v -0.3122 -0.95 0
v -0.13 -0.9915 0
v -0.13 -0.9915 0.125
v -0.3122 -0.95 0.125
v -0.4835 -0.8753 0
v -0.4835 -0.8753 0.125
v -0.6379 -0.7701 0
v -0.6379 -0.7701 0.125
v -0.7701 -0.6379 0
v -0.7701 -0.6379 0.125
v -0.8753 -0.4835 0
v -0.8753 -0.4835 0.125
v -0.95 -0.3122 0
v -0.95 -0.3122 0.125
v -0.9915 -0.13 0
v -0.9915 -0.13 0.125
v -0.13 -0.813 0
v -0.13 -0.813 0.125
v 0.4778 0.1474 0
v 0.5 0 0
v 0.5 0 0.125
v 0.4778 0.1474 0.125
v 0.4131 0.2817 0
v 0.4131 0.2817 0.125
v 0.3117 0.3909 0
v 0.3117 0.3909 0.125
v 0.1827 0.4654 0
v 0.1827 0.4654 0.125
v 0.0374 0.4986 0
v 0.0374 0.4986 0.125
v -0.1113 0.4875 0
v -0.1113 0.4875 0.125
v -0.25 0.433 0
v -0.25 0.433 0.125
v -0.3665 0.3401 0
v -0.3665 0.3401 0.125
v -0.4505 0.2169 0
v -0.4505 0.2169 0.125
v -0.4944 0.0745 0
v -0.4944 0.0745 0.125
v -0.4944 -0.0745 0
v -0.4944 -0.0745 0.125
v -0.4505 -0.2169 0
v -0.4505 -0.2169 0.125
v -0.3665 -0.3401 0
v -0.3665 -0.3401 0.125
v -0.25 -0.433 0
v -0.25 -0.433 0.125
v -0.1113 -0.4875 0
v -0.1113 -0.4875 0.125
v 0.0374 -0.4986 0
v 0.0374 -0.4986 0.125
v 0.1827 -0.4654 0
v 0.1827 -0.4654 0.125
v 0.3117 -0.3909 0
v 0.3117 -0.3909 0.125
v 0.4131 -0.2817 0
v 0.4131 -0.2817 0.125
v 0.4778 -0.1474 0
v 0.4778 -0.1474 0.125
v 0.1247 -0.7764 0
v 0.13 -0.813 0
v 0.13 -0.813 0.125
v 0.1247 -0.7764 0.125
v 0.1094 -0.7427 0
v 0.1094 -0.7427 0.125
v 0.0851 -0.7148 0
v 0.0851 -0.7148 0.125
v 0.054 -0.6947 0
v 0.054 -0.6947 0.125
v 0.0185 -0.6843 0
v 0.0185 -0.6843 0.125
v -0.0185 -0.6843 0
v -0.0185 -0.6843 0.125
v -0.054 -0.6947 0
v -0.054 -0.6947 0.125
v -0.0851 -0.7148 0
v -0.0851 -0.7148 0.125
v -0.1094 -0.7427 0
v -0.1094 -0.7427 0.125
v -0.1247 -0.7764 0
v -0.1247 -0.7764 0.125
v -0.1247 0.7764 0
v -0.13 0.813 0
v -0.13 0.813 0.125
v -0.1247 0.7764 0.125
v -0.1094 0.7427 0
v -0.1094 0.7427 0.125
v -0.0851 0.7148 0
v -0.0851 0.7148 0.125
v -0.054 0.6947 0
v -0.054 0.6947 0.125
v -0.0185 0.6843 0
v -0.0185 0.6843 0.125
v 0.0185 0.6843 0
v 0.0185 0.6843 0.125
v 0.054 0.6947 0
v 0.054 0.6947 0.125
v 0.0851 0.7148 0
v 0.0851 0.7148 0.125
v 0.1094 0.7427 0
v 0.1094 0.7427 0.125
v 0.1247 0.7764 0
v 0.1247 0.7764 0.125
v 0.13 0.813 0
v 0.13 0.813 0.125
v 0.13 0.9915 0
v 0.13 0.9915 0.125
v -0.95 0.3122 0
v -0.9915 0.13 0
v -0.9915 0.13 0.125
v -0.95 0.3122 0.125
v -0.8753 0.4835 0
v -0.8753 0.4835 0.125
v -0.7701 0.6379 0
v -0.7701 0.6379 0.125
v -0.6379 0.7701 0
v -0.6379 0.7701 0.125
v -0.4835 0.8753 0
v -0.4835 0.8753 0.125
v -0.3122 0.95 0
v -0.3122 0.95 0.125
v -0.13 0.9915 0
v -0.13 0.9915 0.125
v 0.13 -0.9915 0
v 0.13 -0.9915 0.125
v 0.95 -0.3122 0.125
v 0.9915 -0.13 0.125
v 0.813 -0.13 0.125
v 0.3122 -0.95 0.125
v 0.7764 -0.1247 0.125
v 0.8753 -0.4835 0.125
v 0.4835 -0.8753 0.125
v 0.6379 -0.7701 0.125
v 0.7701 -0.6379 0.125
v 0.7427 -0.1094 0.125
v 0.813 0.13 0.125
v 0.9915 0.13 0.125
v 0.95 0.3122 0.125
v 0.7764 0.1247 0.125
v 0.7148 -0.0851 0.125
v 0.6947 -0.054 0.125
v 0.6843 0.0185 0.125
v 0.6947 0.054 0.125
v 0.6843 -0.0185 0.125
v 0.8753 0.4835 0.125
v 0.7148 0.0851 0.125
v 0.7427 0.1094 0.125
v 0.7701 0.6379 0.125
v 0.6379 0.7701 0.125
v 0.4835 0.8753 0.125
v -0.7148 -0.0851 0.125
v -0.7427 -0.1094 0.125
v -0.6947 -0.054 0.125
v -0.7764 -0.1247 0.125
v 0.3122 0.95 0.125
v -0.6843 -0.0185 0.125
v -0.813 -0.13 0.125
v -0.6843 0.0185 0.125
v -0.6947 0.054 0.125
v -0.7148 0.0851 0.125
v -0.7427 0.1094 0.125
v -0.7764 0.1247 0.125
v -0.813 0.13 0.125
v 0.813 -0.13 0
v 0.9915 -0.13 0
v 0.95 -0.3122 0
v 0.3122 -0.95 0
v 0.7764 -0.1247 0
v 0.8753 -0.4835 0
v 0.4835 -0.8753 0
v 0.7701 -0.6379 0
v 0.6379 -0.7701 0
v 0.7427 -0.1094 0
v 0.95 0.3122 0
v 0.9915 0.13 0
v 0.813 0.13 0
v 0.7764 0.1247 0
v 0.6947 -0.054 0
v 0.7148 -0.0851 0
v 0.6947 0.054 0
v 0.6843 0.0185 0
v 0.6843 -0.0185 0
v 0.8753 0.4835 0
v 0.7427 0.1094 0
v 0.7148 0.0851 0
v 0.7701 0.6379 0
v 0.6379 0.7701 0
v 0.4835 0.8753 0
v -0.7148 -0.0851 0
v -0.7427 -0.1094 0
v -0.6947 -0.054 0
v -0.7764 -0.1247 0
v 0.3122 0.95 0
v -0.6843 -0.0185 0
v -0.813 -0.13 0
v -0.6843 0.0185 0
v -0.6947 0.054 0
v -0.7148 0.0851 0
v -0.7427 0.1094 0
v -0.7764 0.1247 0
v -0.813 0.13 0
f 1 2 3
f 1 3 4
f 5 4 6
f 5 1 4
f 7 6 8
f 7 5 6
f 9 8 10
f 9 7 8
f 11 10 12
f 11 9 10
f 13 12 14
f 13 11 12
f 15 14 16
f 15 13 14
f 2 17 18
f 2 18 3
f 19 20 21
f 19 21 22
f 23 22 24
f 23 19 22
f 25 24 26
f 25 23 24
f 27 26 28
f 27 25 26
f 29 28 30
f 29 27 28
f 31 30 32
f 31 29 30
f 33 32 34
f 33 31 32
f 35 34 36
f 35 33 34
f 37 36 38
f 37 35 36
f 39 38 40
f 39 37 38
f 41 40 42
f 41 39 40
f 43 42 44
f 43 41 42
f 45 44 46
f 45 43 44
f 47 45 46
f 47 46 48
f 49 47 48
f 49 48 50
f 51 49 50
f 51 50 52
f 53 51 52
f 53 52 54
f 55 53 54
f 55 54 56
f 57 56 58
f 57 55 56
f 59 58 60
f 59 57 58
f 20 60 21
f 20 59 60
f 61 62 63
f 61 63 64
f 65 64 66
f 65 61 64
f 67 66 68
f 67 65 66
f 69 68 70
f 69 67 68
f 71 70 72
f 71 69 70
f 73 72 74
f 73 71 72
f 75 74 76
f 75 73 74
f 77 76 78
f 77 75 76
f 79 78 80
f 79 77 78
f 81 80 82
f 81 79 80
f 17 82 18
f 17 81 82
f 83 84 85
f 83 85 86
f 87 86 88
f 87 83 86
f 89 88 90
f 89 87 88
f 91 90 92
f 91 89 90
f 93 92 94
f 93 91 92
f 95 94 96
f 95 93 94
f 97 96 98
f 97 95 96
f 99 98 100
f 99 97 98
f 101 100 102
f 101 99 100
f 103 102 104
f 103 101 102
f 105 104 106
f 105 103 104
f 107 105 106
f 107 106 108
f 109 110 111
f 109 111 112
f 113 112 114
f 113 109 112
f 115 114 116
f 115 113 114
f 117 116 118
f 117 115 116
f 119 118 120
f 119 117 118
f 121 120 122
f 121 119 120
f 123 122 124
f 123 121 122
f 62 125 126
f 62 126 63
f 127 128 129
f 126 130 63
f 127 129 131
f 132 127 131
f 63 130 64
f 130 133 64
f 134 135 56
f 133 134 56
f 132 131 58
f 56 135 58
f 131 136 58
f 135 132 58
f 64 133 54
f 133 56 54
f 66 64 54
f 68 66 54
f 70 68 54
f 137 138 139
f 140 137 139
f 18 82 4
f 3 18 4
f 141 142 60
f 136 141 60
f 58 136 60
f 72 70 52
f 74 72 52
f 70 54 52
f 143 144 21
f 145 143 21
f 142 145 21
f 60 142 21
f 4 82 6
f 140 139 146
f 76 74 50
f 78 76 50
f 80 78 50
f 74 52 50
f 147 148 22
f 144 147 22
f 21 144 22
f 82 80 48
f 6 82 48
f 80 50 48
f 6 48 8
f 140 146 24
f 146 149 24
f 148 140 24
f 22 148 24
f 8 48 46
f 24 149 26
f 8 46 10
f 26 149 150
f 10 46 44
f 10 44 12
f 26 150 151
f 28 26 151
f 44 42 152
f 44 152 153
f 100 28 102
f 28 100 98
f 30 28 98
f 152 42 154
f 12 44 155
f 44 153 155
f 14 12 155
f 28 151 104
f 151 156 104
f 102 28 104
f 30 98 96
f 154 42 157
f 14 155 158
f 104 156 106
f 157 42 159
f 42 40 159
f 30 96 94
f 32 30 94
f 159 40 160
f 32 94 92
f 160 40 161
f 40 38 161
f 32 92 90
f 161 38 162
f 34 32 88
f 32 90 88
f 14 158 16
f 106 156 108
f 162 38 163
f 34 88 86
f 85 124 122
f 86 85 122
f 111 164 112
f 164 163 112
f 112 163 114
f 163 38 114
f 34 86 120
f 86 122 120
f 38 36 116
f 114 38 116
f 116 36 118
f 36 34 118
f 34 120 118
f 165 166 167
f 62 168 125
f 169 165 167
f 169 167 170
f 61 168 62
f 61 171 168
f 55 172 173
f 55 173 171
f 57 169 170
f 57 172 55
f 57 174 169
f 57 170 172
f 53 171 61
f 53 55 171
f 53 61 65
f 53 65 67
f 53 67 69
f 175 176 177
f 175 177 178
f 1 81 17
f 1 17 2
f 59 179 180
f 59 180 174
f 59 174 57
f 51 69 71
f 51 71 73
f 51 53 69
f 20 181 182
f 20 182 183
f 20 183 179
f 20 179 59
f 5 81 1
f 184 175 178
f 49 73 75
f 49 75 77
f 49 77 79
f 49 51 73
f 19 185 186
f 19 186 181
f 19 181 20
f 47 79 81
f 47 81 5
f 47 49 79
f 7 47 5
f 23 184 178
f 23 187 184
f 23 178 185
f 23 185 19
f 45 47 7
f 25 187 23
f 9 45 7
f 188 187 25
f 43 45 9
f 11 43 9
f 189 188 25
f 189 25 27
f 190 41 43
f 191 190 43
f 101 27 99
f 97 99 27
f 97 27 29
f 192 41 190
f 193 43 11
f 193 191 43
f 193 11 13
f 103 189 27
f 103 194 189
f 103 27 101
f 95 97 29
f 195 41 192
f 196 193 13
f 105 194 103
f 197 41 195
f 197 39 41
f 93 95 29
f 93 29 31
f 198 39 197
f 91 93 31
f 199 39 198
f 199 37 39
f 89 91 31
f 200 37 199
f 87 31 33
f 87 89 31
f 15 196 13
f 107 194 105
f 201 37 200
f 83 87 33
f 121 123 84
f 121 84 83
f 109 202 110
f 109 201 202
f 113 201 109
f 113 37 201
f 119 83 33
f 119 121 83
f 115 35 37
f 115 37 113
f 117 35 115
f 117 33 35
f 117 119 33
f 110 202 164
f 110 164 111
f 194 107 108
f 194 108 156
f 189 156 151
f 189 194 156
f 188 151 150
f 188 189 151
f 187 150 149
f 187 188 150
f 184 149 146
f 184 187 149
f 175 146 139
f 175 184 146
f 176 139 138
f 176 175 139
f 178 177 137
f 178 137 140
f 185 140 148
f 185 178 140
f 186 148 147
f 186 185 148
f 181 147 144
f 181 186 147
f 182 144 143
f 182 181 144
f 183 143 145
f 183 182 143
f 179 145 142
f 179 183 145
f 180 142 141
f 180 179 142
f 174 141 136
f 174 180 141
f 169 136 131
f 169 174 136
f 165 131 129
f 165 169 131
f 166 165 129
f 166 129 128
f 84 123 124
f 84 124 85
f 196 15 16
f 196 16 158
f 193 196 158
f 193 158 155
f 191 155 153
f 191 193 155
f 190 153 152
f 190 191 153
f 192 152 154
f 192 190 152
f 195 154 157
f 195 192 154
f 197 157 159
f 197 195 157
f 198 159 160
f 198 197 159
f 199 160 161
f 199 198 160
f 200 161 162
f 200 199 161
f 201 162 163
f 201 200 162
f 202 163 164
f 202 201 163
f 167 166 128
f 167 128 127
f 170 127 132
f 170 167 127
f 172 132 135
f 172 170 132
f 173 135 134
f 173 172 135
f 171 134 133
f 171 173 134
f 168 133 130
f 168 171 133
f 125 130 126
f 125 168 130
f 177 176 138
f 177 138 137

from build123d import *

# Parameters (mm, degrees)
SKETCH1_R           = 0.5
BOSS_EXTRUDE1_DEPTH = 0.125


with BuildPart() as part:
    # Sketch1 → Boss-Extrude1 (new body)
    with BuildSketch(Plane.XY):
        with BuildLine():
            Line((-0.813, 0.13), (-0.991513994, 0.13))
            ThreePointArc((-0.991513994, 0.13), (-0.707106781, 0.707106781), (-0.13, 0.991513994))
            Line((-0.13, 0.991513994), (-0.13, 0.813))
            ThreePointArc((-0.13, 0.813), (0, 0.683), (0.13, 0.813))
            Line((0.13, 0.813), (0.13, 0.991513994))
            ThreePointArc((0.13, 0.991513994), (0.707106781, 0.707106781), (0.991513994, 0.13))
            Line((0.991513994, 0.13), (0.813, 0.13))
            ThreePointArc((0.813, 0.13), (0.683, 0), (0.813, -0.13))
            Line((0.813, -0.13), (0.991513994, -0.13))
            ThreePointArc((0.991513994, -0.13), (0.707106781, -0.707106781), (0.13, -0.991513994))
            Line((0.13, -0.991513994), (0.13, -0.813))
            ThreePointArc((0.13, -0.813), (0, -0.683), (-0.13, -0.813))
            Line((-0.13, -0.813), (-0.13, -0.991513994))
            ThreePointArc((-0.13, -0.991513994), (-0.707106781, -0.707106781), (-0.991513994, -0.13))
            Line((-0.991513994, -0.13), (-0.813, -0.13))
            ThreePointArc((-0.813, -0.13), (-0.683, 0), (-0.813, 0.13))
        make_face()
        Circle(SKETCH1_R, mode=Mode.SUBTRACT)
    extrude(amount=BOSS_EXTRUDE1_DEPTH)


solid = part.part
